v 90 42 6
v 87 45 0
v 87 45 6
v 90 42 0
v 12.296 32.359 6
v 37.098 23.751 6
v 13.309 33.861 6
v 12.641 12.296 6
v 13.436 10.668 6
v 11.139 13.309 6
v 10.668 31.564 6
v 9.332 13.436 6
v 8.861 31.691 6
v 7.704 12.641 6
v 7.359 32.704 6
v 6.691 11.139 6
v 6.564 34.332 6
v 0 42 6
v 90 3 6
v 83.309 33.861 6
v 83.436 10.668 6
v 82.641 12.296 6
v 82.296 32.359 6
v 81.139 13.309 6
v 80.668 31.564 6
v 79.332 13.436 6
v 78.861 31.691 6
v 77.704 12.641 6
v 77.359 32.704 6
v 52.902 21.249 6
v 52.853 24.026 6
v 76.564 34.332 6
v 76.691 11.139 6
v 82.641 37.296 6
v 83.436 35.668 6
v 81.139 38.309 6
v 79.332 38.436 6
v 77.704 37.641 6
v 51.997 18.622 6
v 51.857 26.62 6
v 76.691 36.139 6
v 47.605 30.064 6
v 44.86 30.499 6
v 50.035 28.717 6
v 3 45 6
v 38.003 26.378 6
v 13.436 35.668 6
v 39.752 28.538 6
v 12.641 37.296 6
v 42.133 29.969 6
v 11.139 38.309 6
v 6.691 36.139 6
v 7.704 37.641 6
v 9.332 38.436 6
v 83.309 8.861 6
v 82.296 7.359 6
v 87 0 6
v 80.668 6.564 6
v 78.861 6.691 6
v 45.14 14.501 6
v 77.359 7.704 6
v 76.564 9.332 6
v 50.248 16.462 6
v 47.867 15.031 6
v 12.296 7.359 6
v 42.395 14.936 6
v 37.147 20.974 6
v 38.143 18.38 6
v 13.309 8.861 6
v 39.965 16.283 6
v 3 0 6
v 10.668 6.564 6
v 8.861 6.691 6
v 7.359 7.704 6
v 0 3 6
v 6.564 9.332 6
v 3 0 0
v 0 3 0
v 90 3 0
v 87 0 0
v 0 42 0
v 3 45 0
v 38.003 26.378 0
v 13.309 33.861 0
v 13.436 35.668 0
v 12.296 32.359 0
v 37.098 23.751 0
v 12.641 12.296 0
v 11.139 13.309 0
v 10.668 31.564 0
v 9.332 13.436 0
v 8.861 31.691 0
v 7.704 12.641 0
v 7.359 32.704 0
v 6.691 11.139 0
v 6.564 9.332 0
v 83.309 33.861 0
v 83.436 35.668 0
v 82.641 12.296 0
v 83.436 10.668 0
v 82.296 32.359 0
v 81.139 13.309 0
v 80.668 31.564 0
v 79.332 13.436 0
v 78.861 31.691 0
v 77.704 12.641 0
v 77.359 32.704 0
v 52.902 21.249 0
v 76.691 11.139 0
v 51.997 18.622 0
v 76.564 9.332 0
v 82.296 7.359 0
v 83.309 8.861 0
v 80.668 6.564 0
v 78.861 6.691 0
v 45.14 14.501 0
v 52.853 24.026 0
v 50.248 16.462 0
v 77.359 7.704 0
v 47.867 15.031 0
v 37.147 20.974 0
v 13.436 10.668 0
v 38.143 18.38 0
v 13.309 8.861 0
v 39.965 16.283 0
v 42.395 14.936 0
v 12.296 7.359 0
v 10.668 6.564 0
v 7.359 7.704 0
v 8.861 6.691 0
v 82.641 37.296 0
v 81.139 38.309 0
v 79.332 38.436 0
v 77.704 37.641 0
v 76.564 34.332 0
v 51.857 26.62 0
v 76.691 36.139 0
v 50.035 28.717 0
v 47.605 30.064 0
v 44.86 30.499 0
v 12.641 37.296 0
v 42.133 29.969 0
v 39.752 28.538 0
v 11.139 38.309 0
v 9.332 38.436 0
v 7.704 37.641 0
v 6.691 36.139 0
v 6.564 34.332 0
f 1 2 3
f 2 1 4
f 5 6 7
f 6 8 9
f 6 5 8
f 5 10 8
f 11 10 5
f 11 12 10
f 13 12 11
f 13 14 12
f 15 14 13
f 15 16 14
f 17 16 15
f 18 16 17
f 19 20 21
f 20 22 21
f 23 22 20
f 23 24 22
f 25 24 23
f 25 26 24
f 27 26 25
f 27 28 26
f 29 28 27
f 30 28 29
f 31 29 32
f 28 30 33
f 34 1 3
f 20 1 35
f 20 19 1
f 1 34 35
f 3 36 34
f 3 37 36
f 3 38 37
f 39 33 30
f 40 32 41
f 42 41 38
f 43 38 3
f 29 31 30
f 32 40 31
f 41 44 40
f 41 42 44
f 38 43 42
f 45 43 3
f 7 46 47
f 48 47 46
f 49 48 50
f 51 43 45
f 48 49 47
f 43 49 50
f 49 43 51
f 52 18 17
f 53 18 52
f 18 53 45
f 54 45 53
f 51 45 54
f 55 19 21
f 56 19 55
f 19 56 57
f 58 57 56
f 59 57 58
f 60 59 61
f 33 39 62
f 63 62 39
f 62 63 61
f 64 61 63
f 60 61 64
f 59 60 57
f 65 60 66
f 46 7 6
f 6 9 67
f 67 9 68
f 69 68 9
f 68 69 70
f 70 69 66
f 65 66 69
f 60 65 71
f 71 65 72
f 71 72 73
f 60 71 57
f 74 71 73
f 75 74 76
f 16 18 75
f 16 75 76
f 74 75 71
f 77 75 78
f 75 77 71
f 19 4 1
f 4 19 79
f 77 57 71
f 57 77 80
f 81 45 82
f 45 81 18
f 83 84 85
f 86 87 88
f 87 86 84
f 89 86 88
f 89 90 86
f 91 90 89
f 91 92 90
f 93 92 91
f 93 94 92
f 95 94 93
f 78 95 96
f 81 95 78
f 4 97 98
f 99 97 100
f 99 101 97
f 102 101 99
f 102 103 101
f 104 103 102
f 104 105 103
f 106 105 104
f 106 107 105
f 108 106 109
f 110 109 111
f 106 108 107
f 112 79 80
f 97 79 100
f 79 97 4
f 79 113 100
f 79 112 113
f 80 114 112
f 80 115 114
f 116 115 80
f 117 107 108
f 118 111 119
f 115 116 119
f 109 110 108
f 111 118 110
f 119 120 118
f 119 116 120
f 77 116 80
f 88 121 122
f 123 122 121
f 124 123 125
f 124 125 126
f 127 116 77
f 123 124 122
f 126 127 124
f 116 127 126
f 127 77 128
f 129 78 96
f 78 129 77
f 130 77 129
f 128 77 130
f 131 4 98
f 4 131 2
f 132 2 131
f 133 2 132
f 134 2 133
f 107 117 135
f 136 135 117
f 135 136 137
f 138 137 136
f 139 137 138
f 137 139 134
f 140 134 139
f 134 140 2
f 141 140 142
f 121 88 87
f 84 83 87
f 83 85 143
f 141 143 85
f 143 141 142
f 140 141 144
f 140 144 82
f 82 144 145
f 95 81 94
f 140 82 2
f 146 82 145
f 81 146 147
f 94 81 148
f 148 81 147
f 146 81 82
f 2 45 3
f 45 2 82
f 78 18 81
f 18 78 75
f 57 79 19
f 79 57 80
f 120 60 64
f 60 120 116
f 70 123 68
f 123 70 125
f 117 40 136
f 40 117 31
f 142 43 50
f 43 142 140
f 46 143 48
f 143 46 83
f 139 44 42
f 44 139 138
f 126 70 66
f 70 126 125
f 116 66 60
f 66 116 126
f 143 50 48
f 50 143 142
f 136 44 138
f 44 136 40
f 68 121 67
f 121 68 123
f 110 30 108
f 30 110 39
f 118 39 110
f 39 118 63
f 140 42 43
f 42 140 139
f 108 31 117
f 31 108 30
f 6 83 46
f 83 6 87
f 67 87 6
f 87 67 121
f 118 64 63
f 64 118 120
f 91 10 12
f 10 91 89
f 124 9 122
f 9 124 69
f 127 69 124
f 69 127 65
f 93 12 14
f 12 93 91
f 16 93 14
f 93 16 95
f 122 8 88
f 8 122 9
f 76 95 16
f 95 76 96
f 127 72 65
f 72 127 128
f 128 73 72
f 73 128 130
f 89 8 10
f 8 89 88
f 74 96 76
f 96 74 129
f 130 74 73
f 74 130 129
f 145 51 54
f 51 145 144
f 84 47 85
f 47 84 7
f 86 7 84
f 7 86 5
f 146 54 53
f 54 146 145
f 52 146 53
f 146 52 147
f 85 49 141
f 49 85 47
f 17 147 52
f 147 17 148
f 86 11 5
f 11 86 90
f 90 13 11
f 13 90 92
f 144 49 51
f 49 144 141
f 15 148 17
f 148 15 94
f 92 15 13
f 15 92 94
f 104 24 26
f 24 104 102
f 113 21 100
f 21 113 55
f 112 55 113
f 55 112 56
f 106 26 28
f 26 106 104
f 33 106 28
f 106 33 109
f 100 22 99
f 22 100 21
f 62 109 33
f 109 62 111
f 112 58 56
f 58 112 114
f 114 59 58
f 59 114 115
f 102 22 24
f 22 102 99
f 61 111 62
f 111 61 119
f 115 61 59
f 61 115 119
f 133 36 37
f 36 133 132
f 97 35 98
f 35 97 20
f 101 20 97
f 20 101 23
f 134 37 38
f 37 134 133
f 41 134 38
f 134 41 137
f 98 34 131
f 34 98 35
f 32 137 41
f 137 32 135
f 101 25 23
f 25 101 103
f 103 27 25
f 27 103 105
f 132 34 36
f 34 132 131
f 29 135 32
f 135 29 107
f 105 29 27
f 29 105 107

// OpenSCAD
$fn = 32;

// ----------------------------------------------------------------------
// Spacer plate: rect 90 x 45
// ----------------------------------------------------------------------

// --- parameters (mm) ---
bore_r = 8;               // centre bore radius
bolt_r = 3.5;             // bolt hole radius
plate_t = 6;              // plate thickness, Z (extrusion height)
plate_l = 90;             // plate length, X
plate_w = 45;             // plate width, Y
inset = 10;               // corner hole inset

profile = [[3, 0], [87, 0], [90, 3], [90, 42], [87, 45], [3, 45], [0, 42], [0, 3]];  // primary outline, 8 points, counter clockwise
void_1 = [[52.853, 24.026], [51.857, 26.62], [50.035, 28.717], [47.605, 30.064], [44.86, 30.499], [42.133, 29.969], [39.752, 28.538], [38.003, 26.378], [37.098, 23.751], [37.147, 20.974], [38.143, 18.38], [39.965, 16.283], [42.395, 14.936], [45.14, 14.501], [47.867, 15.031], [50.248, 16.462], [51.997, 18.622], [52.902, 21.249]];  // centre bore, 18 points
void_2 = [[13.436, 10.668], [12.641, 12.296], [11.139, 13.309], [9.332, 13.436], [7.704, 12.641], [6.691, 11.139], [6.564, 9.332], [7.359, 7.704], [8.861, 6.691], [10.668, 6.564], [12.296, 7.359], [13.309, 8.861]];  // corner hole, 12 points
void_3 = [[13.436, 35.668], [12.641, 37.296], [11.139, 38.309], [9.332, 38.436], [7.704, 37.641], [6.691, 36.139], [6.564, 34.332], [7.359, 32.704], [8.861, 31.691], [10.668, 31.564], [12.296, 32.359], [13.309, 33.861]];  // corner hole, 12 points
void_4 = [[83.436, 10.668], [82.641, 12.296], [81.139, 13.309], [79.332, 13.436], [77.704, 12.641], [76.691, 11.139], [76.564, 9.332], [77.359, 7.704], [78.861, 6.691], [80.668, 6.564], [82.296, 7.359], [83.309, 8.861]];  // corner hole, 12 points
void_5 = [[83.436, 35.668], [82.641, 37.296], [81.139, 38.309], [79.332, 38.436], [77.704, 37.641], [76.691, 36.139], [76.564, 34.332], [77.359, 32.704], [78.861, 31.691], [80.668, 31.564], [82.296, 32.359], [83.309, 33.861]];  // corner hole, 12 points

// --- the one profile operation ---
difference() {
  linear_extrude(height = plate_t) polygon(points = profile);
  translate([0, 0, -1])
    linear_extrude(height = plate_t + 2) polygon(points = void_1);
  translate([0, 0, -1])
    linear_extrude(height = plate_t + 2) polygon(points = void_2);
  translate([0, 0, -1])
    linear_extrude(height = plate_t + 2) polygon(points = void_3);
  translate([0, 0, -1])
    linear_extrude(height = plate_t + 2) polygon(points = void_4);
  translate([0, 0, -1])
    linear_extrude(height = plate_t + 2) polygon(points = void_5);
}
